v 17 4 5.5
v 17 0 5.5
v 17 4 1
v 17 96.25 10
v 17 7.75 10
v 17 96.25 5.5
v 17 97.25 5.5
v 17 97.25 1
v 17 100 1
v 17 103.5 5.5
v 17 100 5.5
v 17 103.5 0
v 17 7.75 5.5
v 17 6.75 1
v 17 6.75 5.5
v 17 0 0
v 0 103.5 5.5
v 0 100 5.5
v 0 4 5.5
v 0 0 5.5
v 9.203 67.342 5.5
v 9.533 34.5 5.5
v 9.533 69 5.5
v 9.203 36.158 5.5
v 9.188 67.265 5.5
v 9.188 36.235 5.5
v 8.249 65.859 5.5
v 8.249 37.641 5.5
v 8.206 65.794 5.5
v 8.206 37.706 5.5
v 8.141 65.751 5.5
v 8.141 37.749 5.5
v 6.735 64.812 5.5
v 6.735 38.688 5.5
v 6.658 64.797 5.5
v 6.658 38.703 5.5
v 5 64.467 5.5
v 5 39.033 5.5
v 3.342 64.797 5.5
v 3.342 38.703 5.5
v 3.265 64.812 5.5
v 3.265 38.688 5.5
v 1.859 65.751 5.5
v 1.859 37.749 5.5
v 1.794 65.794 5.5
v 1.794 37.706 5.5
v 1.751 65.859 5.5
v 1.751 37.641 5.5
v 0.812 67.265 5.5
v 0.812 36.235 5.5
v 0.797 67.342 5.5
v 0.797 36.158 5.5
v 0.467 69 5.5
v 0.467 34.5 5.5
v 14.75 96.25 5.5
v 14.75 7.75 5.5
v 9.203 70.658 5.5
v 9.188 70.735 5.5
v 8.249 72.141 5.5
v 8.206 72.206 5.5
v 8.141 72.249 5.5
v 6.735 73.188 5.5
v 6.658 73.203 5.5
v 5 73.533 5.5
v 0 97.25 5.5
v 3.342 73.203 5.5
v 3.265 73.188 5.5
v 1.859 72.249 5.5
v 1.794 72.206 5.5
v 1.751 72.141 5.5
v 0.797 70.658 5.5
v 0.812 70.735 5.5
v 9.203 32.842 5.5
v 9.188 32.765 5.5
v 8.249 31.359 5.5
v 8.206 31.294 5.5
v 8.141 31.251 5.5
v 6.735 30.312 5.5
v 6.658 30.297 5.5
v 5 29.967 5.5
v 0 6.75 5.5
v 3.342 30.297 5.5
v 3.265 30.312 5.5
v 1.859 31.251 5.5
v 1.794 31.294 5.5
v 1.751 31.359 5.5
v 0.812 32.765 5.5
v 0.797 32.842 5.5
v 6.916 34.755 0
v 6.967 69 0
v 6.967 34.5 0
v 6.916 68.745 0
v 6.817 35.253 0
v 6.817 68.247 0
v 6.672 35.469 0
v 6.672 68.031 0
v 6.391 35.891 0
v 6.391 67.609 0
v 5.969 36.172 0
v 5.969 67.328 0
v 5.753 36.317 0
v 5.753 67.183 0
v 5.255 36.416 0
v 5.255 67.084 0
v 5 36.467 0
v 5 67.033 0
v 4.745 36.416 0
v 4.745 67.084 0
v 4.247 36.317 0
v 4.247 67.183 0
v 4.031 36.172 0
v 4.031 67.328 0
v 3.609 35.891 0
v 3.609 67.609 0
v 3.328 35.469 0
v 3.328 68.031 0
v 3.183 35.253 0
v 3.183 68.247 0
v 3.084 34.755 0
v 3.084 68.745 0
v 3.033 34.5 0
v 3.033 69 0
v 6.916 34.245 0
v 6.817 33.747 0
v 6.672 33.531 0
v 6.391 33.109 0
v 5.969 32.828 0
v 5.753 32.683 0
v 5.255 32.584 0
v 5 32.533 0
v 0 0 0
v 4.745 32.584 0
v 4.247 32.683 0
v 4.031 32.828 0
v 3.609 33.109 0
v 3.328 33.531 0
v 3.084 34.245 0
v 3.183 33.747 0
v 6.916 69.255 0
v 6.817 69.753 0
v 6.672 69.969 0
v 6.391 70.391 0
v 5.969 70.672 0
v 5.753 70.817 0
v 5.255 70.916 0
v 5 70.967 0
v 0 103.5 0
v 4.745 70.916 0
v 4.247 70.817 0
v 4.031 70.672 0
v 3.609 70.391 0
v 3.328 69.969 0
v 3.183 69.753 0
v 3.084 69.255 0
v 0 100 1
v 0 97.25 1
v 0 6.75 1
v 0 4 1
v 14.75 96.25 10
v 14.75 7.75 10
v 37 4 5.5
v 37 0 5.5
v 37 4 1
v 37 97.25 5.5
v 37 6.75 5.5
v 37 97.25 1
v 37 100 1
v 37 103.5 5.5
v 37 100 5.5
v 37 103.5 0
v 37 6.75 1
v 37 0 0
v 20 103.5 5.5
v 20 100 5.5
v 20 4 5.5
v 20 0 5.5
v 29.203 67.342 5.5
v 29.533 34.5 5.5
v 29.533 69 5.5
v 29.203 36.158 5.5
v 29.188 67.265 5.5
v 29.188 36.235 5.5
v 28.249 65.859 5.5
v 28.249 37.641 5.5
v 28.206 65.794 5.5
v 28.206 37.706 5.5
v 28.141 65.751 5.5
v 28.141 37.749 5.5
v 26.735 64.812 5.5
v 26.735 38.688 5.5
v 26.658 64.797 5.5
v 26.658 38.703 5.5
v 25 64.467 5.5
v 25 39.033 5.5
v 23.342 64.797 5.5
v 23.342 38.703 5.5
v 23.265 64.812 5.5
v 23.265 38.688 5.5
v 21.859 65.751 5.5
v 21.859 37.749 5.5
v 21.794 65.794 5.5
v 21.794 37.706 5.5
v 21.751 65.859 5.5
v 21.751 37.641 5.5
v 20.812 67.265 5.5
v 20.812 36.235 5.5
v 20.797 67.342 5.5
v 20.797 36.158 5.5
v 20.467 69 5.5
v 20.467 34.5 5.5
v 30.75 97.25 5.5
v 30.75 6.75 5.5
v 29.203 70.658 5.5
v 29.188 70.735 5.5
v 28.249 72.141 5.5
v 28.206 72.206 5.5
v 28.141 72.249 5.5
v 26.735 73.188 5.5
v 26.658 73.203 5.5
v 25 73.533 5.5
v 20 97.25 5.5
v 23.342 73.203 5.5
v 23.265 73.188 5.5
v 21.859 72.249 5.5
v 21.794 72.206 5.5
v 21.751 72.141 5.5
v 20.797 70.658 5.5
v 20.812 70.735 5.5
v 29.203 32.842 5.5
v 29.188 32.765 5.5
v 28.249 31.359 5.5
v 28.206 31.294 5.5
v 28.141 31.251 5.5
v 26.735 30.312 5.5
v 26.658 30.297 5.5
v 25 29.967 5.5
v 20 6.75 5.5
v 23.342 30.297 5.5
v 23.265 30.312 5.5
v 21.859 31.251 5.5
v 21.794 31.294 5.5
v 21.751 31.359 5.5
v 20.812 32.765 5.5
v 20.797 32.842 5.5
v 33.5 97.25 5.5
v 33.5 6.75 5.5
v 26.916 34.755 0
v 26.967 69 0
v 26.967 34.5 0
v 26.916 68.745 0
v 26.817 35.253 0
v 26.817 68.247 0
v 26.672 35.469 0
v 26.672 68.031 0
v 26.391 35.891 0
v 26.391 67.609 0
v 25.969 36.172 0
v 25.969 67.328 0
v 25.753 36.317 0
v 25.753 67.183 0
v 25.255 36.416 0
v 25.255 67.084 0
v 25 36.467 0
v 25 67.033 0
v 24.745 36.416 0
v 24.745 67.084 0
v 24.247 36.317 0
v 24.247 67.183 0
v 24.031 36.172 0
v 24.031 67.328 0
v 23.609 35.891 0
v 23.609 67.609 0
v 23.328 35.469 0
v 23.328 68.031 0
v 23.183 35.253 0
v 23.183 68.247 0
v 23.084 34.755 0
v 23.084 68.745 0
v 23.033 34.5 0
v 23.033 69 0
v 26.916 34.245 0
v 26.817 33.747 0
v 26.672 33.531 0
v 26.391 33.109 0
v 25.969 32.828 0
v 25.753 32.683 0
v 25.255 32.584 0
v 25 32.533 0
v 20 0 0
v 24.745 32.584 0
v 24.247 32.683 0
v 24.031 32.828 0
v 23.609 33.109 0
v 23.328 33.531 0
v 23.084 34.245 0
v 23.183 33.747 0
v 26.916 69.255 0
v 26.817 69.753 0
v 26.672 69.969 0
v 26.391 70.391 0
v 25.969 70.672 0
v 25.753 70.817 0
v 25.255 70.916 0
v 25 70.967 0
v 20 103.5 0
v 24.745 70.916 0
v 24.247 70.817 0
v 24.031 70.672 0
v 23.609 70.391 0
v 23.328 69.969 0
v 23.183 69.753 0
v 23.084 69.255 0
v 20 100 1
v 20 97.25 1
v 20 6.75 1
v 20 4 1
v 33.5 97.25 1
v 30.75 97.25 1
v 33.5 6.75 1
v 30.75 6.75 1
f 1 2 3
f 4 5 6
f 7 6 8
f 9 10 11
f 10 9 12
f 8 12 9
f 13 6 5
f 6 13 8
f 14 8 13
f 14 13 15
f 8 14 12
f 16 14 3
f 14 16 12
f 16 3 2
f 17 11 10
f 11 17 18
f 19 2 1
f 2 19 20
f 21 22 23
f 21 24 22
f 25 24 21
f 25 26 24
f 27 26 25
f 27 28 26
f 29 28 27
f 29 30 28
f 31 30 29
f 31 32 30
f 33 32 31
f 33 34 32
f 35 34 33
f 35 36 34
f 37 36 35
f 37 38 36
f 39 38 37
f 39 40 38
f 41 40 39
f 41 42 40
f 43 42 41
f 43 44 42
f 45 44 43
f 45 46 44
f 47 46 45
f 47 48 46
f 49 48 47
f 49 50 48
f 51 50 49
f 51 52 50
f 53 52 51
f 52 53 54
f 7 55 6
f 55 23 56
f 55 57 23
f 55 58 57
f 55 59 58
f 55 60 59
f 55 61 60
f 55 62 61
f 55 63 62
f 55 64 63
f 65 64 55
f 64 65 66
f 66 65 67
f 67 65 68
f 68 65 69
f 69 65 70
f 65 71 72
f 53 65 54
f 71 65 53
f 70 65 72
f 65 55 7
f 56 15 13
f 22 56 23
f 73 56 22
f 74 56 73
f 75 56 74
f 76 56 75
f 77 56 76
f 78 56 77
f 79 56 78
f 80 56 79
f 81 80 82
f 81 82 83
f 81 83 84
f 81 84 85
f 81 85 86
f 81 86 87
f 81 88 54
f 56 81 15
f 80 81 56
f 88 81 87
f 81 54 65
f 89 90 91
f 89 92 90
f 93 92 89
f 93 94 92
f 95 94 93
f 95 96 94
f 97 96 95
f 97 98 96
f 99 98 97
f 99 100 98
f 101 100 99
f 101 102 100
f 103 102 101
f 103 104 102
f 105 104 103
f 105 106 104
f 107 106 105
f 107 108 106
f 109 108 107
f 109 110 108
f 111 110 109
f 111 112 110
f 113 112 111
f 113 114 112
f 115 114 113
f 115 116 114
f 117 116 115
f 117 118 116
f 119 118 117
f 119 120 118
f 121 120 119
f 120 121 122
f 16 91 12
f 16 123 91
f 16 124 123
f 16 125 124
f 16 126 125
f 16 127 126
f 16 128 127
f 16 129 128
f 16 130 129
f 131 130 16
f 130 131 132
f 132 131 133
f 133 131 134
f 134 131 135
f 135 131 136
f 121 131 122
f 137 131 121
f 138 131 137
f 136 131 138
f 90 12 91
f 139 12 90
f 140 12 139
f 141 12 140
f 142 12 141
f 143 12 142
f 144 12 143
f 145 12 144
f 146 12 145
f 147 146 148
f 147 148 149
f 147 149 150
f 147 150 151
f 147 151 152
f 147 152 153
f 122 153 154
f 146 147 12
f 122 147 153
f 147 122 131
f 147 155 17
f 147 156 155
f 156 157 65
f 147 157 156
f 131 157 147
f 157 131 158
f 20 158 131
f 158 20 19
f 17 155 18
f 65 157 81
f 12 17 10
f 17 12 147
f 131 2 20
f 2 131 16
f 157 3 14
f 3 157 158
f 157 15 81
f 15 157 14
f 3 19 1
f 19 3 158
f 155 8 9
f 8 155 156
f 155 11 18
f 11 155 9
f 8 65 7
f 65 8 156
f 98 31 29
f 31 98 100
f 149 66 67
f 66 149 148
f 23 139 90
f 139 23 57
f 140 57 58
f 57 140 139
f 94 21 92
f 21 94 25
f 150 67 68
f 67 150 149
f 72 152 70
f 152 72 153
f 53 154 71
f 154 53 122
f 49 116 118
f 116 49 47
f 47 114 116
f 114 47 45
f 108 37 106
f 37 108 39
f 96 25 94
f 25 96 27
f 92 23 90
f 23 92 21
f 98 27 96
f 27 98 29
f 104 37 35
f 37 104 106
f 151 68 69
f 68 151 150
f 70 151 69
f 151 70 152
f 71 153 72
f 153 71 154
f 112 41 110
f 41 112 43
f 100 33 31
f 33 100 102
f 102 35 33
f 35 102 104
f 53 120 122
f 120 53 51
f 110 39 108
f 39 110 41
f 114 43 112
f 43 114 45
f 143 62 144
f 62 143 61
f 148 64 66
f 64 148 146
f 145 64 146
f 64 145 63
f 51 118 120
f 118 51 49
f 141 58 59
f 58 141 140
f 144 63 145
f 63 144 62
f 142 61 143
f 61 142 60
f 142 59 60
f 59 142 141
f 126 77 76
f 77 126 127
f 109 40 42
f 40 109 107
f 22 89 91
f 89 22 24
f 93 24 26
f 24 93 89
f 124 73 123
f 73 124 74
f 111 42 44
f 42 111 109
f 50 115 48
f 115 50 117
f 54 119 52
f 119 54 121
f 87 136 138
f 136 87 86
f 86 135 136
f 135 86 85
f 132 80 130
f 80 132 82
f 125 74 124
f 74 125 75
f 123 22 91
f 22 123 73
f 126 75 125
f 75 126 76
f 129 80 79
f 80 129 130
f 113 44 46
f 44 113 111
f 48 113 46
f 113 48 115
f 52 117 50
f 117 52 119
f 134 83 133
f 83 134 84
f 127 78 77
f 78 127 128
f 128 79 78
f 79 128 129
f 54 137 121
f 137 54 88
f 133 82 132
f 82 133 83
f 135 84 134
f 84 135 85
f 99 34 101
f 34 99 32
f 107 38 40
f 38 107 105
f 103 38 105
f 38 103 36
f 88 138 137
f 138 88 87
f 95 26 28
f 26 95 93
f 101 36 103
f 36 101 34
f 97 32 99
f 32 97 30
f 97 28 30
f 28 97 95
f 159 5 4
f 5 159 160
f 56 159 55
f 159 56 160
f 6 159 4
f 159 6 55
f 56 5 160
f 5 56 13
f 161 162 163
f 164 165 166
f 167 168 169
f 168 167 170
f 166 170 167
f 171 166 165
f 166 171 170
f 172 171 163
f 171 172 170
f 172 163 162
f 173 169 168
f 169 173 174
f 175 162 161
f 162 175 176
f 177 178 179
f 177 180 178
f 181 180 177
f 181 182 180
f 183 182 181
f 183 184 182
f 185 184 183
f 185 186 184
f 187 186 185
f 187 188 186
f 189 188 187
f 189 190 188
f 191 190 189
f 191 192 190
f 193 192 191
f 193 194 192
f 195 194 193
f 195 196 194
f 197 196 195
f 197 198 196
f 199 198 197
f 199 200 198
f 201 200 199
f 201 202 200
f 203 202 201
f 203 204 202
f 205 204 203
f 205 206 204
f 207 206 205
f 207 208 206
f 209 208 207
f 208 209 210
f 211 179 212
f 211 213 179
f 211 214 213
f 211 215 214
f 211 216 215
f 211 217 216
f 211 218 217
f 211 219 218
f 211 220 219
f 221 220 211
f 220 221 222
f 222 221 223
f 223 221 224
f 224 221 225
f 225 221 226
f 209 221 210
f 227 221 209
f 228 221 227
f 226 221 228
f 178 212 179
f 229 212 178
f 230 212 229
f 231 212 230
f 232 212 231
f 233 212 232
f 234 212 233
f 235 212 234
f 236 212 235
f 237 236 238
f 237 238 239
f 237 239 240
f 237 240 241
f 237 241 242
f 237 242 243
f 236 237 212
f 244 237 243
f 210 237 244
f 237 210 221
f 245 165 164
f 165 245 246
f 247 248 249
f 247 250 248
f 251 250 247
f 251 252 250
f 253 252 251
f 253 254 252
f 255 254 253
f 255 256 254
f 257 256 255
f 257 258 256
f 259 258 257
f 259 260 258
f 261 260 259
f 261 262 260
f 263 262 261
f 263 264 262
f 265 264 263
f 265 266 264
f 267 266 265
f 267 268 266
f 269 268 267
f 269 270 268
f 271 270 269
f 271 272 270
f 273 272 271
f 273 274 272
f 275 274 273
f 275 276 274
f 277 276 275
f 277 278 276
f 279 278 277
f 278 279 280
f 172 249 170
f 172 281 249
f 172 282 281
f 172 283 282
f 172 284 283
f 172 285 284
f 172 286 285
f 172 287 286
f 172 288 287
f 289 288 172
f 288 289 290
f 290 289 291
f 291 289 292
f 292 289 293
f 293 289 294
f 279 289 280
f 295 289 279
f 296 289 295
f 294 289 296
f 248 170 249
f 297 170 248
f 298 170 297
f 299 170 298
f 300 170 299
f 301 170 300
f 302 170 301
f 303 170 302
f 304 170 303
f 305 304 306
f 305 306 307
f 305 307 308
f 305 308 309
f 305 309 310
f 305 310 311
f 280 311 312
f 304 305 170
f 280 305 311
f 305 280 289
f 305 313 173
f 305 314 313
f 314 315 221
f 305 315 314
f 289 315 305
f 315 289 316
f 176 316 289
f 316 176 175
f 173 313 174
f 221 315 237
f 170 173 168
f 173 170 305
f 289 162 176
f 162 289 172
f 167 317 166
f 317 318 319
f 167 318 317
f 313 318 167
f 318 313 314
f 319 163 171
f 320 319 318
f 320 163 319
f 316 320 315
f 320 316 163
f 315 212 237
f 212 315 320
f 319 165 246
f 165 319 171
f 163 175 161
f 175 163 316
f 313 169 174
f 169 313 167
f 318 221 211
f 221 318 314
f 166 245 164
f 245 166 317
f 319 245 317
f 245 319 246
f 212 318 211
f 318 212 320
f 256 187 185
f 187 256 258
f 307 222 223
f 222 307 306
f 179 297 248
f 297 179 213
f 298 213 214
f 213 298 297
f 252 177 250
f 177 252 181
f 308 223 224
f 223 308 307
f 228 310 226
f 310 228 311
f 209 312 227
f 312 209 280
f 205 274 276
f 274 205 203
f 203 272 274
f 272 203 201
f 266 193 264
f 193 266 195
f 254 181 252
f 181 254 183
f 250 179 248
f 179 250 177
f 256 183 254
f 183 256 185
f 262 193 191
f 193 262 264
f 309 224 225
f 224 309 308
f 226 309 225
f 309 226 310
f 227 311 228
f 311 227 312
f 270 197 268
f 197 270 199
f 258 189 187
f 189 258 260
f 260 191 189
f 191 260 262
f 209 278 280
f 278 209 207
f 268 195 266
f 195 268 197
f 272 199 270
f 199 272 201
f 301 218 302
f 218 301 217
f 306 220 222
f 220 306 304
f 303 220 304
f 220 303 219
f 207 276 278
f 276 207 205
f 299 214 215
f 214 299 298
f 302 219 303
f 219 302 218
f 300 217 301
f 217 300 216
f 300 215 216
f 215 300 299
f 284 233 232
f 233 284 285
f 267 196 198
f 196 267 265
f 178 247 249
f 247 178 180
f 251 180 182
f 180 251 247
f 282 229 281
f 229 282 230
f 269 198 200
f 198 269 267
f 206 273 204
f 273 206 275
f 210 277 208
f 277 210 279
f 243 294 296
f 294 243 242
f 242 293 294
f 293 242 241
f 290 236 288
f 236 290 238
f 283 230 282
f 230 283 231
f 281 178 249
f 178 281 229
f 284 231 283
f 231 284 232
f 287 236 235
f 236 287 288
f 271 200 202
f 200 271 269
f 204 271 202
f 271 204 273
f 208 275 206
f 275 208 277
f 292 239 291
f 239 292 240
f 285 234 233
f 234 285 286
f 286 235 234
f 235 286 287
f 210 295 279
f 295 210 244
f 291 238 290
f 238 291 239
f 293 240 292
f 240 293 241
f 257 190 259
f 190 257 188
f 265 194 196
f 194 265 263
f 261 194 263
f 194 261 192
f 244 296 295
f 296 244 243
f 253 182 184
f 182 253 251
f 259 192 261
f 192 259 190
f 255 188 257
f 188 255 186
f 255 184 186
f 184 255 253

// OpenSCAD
out=95.5;
in = 91;
step =3.5;
footthick=1;

material = (out-in)/2;
margin=4;
stripwidth=17;
stripthick = footthick+step+1;
basewidth = out+margin*2;

module front_base(){
  difference() {
   cube([stripwidth,basewidth,stripthick]);
   translate([0,margin,footthick]) cube([stripwidth+2,material+.5, stripthick]);
   translate([0,basewidth-margin-material,footthick]) cube([stripwidth+2,material+.5, stripthick]);

   translate([stripwidth-margin-material,margin,footthick]) cube([material+.5,basewidth-2*margin, stripthick]);

   translate([5,basewidth*2/3,-1]) cylinder(r1=1.5, r2=5, h=stripthick+2);
   translate([5,basewidth*1/3,-1]) cylinder(r1=1.5, r2=5, h=stripthick+2);
  }
}

module back_base(){
  difference() {
   cube([stripwidth,basewidth,stripthick]);
   translate([0,margin,footthick]) cube([stripwidth+2,material+.5, stripthick]);
   translate([0,basewidth-margin-material,footthick])
     cube([stripwidth+2,material+.5, stripthick]);

   translate([5,basewidth*2/3,-1]) cylinder(r1=1.5, r2=5, h=stripthick+2);
   translate([5,basewidth*1/3,-1]) cylinder(r1=1.5, r2=5, h=stripthick+2);
  }
  translate([stripwidth-material,margin+material+1.5,stripthick-1])
    cube([material,basewidth-2*margin-2*material-2.5, stripthick]);
}

back_base();
translate([20,0,0]) front_base();
